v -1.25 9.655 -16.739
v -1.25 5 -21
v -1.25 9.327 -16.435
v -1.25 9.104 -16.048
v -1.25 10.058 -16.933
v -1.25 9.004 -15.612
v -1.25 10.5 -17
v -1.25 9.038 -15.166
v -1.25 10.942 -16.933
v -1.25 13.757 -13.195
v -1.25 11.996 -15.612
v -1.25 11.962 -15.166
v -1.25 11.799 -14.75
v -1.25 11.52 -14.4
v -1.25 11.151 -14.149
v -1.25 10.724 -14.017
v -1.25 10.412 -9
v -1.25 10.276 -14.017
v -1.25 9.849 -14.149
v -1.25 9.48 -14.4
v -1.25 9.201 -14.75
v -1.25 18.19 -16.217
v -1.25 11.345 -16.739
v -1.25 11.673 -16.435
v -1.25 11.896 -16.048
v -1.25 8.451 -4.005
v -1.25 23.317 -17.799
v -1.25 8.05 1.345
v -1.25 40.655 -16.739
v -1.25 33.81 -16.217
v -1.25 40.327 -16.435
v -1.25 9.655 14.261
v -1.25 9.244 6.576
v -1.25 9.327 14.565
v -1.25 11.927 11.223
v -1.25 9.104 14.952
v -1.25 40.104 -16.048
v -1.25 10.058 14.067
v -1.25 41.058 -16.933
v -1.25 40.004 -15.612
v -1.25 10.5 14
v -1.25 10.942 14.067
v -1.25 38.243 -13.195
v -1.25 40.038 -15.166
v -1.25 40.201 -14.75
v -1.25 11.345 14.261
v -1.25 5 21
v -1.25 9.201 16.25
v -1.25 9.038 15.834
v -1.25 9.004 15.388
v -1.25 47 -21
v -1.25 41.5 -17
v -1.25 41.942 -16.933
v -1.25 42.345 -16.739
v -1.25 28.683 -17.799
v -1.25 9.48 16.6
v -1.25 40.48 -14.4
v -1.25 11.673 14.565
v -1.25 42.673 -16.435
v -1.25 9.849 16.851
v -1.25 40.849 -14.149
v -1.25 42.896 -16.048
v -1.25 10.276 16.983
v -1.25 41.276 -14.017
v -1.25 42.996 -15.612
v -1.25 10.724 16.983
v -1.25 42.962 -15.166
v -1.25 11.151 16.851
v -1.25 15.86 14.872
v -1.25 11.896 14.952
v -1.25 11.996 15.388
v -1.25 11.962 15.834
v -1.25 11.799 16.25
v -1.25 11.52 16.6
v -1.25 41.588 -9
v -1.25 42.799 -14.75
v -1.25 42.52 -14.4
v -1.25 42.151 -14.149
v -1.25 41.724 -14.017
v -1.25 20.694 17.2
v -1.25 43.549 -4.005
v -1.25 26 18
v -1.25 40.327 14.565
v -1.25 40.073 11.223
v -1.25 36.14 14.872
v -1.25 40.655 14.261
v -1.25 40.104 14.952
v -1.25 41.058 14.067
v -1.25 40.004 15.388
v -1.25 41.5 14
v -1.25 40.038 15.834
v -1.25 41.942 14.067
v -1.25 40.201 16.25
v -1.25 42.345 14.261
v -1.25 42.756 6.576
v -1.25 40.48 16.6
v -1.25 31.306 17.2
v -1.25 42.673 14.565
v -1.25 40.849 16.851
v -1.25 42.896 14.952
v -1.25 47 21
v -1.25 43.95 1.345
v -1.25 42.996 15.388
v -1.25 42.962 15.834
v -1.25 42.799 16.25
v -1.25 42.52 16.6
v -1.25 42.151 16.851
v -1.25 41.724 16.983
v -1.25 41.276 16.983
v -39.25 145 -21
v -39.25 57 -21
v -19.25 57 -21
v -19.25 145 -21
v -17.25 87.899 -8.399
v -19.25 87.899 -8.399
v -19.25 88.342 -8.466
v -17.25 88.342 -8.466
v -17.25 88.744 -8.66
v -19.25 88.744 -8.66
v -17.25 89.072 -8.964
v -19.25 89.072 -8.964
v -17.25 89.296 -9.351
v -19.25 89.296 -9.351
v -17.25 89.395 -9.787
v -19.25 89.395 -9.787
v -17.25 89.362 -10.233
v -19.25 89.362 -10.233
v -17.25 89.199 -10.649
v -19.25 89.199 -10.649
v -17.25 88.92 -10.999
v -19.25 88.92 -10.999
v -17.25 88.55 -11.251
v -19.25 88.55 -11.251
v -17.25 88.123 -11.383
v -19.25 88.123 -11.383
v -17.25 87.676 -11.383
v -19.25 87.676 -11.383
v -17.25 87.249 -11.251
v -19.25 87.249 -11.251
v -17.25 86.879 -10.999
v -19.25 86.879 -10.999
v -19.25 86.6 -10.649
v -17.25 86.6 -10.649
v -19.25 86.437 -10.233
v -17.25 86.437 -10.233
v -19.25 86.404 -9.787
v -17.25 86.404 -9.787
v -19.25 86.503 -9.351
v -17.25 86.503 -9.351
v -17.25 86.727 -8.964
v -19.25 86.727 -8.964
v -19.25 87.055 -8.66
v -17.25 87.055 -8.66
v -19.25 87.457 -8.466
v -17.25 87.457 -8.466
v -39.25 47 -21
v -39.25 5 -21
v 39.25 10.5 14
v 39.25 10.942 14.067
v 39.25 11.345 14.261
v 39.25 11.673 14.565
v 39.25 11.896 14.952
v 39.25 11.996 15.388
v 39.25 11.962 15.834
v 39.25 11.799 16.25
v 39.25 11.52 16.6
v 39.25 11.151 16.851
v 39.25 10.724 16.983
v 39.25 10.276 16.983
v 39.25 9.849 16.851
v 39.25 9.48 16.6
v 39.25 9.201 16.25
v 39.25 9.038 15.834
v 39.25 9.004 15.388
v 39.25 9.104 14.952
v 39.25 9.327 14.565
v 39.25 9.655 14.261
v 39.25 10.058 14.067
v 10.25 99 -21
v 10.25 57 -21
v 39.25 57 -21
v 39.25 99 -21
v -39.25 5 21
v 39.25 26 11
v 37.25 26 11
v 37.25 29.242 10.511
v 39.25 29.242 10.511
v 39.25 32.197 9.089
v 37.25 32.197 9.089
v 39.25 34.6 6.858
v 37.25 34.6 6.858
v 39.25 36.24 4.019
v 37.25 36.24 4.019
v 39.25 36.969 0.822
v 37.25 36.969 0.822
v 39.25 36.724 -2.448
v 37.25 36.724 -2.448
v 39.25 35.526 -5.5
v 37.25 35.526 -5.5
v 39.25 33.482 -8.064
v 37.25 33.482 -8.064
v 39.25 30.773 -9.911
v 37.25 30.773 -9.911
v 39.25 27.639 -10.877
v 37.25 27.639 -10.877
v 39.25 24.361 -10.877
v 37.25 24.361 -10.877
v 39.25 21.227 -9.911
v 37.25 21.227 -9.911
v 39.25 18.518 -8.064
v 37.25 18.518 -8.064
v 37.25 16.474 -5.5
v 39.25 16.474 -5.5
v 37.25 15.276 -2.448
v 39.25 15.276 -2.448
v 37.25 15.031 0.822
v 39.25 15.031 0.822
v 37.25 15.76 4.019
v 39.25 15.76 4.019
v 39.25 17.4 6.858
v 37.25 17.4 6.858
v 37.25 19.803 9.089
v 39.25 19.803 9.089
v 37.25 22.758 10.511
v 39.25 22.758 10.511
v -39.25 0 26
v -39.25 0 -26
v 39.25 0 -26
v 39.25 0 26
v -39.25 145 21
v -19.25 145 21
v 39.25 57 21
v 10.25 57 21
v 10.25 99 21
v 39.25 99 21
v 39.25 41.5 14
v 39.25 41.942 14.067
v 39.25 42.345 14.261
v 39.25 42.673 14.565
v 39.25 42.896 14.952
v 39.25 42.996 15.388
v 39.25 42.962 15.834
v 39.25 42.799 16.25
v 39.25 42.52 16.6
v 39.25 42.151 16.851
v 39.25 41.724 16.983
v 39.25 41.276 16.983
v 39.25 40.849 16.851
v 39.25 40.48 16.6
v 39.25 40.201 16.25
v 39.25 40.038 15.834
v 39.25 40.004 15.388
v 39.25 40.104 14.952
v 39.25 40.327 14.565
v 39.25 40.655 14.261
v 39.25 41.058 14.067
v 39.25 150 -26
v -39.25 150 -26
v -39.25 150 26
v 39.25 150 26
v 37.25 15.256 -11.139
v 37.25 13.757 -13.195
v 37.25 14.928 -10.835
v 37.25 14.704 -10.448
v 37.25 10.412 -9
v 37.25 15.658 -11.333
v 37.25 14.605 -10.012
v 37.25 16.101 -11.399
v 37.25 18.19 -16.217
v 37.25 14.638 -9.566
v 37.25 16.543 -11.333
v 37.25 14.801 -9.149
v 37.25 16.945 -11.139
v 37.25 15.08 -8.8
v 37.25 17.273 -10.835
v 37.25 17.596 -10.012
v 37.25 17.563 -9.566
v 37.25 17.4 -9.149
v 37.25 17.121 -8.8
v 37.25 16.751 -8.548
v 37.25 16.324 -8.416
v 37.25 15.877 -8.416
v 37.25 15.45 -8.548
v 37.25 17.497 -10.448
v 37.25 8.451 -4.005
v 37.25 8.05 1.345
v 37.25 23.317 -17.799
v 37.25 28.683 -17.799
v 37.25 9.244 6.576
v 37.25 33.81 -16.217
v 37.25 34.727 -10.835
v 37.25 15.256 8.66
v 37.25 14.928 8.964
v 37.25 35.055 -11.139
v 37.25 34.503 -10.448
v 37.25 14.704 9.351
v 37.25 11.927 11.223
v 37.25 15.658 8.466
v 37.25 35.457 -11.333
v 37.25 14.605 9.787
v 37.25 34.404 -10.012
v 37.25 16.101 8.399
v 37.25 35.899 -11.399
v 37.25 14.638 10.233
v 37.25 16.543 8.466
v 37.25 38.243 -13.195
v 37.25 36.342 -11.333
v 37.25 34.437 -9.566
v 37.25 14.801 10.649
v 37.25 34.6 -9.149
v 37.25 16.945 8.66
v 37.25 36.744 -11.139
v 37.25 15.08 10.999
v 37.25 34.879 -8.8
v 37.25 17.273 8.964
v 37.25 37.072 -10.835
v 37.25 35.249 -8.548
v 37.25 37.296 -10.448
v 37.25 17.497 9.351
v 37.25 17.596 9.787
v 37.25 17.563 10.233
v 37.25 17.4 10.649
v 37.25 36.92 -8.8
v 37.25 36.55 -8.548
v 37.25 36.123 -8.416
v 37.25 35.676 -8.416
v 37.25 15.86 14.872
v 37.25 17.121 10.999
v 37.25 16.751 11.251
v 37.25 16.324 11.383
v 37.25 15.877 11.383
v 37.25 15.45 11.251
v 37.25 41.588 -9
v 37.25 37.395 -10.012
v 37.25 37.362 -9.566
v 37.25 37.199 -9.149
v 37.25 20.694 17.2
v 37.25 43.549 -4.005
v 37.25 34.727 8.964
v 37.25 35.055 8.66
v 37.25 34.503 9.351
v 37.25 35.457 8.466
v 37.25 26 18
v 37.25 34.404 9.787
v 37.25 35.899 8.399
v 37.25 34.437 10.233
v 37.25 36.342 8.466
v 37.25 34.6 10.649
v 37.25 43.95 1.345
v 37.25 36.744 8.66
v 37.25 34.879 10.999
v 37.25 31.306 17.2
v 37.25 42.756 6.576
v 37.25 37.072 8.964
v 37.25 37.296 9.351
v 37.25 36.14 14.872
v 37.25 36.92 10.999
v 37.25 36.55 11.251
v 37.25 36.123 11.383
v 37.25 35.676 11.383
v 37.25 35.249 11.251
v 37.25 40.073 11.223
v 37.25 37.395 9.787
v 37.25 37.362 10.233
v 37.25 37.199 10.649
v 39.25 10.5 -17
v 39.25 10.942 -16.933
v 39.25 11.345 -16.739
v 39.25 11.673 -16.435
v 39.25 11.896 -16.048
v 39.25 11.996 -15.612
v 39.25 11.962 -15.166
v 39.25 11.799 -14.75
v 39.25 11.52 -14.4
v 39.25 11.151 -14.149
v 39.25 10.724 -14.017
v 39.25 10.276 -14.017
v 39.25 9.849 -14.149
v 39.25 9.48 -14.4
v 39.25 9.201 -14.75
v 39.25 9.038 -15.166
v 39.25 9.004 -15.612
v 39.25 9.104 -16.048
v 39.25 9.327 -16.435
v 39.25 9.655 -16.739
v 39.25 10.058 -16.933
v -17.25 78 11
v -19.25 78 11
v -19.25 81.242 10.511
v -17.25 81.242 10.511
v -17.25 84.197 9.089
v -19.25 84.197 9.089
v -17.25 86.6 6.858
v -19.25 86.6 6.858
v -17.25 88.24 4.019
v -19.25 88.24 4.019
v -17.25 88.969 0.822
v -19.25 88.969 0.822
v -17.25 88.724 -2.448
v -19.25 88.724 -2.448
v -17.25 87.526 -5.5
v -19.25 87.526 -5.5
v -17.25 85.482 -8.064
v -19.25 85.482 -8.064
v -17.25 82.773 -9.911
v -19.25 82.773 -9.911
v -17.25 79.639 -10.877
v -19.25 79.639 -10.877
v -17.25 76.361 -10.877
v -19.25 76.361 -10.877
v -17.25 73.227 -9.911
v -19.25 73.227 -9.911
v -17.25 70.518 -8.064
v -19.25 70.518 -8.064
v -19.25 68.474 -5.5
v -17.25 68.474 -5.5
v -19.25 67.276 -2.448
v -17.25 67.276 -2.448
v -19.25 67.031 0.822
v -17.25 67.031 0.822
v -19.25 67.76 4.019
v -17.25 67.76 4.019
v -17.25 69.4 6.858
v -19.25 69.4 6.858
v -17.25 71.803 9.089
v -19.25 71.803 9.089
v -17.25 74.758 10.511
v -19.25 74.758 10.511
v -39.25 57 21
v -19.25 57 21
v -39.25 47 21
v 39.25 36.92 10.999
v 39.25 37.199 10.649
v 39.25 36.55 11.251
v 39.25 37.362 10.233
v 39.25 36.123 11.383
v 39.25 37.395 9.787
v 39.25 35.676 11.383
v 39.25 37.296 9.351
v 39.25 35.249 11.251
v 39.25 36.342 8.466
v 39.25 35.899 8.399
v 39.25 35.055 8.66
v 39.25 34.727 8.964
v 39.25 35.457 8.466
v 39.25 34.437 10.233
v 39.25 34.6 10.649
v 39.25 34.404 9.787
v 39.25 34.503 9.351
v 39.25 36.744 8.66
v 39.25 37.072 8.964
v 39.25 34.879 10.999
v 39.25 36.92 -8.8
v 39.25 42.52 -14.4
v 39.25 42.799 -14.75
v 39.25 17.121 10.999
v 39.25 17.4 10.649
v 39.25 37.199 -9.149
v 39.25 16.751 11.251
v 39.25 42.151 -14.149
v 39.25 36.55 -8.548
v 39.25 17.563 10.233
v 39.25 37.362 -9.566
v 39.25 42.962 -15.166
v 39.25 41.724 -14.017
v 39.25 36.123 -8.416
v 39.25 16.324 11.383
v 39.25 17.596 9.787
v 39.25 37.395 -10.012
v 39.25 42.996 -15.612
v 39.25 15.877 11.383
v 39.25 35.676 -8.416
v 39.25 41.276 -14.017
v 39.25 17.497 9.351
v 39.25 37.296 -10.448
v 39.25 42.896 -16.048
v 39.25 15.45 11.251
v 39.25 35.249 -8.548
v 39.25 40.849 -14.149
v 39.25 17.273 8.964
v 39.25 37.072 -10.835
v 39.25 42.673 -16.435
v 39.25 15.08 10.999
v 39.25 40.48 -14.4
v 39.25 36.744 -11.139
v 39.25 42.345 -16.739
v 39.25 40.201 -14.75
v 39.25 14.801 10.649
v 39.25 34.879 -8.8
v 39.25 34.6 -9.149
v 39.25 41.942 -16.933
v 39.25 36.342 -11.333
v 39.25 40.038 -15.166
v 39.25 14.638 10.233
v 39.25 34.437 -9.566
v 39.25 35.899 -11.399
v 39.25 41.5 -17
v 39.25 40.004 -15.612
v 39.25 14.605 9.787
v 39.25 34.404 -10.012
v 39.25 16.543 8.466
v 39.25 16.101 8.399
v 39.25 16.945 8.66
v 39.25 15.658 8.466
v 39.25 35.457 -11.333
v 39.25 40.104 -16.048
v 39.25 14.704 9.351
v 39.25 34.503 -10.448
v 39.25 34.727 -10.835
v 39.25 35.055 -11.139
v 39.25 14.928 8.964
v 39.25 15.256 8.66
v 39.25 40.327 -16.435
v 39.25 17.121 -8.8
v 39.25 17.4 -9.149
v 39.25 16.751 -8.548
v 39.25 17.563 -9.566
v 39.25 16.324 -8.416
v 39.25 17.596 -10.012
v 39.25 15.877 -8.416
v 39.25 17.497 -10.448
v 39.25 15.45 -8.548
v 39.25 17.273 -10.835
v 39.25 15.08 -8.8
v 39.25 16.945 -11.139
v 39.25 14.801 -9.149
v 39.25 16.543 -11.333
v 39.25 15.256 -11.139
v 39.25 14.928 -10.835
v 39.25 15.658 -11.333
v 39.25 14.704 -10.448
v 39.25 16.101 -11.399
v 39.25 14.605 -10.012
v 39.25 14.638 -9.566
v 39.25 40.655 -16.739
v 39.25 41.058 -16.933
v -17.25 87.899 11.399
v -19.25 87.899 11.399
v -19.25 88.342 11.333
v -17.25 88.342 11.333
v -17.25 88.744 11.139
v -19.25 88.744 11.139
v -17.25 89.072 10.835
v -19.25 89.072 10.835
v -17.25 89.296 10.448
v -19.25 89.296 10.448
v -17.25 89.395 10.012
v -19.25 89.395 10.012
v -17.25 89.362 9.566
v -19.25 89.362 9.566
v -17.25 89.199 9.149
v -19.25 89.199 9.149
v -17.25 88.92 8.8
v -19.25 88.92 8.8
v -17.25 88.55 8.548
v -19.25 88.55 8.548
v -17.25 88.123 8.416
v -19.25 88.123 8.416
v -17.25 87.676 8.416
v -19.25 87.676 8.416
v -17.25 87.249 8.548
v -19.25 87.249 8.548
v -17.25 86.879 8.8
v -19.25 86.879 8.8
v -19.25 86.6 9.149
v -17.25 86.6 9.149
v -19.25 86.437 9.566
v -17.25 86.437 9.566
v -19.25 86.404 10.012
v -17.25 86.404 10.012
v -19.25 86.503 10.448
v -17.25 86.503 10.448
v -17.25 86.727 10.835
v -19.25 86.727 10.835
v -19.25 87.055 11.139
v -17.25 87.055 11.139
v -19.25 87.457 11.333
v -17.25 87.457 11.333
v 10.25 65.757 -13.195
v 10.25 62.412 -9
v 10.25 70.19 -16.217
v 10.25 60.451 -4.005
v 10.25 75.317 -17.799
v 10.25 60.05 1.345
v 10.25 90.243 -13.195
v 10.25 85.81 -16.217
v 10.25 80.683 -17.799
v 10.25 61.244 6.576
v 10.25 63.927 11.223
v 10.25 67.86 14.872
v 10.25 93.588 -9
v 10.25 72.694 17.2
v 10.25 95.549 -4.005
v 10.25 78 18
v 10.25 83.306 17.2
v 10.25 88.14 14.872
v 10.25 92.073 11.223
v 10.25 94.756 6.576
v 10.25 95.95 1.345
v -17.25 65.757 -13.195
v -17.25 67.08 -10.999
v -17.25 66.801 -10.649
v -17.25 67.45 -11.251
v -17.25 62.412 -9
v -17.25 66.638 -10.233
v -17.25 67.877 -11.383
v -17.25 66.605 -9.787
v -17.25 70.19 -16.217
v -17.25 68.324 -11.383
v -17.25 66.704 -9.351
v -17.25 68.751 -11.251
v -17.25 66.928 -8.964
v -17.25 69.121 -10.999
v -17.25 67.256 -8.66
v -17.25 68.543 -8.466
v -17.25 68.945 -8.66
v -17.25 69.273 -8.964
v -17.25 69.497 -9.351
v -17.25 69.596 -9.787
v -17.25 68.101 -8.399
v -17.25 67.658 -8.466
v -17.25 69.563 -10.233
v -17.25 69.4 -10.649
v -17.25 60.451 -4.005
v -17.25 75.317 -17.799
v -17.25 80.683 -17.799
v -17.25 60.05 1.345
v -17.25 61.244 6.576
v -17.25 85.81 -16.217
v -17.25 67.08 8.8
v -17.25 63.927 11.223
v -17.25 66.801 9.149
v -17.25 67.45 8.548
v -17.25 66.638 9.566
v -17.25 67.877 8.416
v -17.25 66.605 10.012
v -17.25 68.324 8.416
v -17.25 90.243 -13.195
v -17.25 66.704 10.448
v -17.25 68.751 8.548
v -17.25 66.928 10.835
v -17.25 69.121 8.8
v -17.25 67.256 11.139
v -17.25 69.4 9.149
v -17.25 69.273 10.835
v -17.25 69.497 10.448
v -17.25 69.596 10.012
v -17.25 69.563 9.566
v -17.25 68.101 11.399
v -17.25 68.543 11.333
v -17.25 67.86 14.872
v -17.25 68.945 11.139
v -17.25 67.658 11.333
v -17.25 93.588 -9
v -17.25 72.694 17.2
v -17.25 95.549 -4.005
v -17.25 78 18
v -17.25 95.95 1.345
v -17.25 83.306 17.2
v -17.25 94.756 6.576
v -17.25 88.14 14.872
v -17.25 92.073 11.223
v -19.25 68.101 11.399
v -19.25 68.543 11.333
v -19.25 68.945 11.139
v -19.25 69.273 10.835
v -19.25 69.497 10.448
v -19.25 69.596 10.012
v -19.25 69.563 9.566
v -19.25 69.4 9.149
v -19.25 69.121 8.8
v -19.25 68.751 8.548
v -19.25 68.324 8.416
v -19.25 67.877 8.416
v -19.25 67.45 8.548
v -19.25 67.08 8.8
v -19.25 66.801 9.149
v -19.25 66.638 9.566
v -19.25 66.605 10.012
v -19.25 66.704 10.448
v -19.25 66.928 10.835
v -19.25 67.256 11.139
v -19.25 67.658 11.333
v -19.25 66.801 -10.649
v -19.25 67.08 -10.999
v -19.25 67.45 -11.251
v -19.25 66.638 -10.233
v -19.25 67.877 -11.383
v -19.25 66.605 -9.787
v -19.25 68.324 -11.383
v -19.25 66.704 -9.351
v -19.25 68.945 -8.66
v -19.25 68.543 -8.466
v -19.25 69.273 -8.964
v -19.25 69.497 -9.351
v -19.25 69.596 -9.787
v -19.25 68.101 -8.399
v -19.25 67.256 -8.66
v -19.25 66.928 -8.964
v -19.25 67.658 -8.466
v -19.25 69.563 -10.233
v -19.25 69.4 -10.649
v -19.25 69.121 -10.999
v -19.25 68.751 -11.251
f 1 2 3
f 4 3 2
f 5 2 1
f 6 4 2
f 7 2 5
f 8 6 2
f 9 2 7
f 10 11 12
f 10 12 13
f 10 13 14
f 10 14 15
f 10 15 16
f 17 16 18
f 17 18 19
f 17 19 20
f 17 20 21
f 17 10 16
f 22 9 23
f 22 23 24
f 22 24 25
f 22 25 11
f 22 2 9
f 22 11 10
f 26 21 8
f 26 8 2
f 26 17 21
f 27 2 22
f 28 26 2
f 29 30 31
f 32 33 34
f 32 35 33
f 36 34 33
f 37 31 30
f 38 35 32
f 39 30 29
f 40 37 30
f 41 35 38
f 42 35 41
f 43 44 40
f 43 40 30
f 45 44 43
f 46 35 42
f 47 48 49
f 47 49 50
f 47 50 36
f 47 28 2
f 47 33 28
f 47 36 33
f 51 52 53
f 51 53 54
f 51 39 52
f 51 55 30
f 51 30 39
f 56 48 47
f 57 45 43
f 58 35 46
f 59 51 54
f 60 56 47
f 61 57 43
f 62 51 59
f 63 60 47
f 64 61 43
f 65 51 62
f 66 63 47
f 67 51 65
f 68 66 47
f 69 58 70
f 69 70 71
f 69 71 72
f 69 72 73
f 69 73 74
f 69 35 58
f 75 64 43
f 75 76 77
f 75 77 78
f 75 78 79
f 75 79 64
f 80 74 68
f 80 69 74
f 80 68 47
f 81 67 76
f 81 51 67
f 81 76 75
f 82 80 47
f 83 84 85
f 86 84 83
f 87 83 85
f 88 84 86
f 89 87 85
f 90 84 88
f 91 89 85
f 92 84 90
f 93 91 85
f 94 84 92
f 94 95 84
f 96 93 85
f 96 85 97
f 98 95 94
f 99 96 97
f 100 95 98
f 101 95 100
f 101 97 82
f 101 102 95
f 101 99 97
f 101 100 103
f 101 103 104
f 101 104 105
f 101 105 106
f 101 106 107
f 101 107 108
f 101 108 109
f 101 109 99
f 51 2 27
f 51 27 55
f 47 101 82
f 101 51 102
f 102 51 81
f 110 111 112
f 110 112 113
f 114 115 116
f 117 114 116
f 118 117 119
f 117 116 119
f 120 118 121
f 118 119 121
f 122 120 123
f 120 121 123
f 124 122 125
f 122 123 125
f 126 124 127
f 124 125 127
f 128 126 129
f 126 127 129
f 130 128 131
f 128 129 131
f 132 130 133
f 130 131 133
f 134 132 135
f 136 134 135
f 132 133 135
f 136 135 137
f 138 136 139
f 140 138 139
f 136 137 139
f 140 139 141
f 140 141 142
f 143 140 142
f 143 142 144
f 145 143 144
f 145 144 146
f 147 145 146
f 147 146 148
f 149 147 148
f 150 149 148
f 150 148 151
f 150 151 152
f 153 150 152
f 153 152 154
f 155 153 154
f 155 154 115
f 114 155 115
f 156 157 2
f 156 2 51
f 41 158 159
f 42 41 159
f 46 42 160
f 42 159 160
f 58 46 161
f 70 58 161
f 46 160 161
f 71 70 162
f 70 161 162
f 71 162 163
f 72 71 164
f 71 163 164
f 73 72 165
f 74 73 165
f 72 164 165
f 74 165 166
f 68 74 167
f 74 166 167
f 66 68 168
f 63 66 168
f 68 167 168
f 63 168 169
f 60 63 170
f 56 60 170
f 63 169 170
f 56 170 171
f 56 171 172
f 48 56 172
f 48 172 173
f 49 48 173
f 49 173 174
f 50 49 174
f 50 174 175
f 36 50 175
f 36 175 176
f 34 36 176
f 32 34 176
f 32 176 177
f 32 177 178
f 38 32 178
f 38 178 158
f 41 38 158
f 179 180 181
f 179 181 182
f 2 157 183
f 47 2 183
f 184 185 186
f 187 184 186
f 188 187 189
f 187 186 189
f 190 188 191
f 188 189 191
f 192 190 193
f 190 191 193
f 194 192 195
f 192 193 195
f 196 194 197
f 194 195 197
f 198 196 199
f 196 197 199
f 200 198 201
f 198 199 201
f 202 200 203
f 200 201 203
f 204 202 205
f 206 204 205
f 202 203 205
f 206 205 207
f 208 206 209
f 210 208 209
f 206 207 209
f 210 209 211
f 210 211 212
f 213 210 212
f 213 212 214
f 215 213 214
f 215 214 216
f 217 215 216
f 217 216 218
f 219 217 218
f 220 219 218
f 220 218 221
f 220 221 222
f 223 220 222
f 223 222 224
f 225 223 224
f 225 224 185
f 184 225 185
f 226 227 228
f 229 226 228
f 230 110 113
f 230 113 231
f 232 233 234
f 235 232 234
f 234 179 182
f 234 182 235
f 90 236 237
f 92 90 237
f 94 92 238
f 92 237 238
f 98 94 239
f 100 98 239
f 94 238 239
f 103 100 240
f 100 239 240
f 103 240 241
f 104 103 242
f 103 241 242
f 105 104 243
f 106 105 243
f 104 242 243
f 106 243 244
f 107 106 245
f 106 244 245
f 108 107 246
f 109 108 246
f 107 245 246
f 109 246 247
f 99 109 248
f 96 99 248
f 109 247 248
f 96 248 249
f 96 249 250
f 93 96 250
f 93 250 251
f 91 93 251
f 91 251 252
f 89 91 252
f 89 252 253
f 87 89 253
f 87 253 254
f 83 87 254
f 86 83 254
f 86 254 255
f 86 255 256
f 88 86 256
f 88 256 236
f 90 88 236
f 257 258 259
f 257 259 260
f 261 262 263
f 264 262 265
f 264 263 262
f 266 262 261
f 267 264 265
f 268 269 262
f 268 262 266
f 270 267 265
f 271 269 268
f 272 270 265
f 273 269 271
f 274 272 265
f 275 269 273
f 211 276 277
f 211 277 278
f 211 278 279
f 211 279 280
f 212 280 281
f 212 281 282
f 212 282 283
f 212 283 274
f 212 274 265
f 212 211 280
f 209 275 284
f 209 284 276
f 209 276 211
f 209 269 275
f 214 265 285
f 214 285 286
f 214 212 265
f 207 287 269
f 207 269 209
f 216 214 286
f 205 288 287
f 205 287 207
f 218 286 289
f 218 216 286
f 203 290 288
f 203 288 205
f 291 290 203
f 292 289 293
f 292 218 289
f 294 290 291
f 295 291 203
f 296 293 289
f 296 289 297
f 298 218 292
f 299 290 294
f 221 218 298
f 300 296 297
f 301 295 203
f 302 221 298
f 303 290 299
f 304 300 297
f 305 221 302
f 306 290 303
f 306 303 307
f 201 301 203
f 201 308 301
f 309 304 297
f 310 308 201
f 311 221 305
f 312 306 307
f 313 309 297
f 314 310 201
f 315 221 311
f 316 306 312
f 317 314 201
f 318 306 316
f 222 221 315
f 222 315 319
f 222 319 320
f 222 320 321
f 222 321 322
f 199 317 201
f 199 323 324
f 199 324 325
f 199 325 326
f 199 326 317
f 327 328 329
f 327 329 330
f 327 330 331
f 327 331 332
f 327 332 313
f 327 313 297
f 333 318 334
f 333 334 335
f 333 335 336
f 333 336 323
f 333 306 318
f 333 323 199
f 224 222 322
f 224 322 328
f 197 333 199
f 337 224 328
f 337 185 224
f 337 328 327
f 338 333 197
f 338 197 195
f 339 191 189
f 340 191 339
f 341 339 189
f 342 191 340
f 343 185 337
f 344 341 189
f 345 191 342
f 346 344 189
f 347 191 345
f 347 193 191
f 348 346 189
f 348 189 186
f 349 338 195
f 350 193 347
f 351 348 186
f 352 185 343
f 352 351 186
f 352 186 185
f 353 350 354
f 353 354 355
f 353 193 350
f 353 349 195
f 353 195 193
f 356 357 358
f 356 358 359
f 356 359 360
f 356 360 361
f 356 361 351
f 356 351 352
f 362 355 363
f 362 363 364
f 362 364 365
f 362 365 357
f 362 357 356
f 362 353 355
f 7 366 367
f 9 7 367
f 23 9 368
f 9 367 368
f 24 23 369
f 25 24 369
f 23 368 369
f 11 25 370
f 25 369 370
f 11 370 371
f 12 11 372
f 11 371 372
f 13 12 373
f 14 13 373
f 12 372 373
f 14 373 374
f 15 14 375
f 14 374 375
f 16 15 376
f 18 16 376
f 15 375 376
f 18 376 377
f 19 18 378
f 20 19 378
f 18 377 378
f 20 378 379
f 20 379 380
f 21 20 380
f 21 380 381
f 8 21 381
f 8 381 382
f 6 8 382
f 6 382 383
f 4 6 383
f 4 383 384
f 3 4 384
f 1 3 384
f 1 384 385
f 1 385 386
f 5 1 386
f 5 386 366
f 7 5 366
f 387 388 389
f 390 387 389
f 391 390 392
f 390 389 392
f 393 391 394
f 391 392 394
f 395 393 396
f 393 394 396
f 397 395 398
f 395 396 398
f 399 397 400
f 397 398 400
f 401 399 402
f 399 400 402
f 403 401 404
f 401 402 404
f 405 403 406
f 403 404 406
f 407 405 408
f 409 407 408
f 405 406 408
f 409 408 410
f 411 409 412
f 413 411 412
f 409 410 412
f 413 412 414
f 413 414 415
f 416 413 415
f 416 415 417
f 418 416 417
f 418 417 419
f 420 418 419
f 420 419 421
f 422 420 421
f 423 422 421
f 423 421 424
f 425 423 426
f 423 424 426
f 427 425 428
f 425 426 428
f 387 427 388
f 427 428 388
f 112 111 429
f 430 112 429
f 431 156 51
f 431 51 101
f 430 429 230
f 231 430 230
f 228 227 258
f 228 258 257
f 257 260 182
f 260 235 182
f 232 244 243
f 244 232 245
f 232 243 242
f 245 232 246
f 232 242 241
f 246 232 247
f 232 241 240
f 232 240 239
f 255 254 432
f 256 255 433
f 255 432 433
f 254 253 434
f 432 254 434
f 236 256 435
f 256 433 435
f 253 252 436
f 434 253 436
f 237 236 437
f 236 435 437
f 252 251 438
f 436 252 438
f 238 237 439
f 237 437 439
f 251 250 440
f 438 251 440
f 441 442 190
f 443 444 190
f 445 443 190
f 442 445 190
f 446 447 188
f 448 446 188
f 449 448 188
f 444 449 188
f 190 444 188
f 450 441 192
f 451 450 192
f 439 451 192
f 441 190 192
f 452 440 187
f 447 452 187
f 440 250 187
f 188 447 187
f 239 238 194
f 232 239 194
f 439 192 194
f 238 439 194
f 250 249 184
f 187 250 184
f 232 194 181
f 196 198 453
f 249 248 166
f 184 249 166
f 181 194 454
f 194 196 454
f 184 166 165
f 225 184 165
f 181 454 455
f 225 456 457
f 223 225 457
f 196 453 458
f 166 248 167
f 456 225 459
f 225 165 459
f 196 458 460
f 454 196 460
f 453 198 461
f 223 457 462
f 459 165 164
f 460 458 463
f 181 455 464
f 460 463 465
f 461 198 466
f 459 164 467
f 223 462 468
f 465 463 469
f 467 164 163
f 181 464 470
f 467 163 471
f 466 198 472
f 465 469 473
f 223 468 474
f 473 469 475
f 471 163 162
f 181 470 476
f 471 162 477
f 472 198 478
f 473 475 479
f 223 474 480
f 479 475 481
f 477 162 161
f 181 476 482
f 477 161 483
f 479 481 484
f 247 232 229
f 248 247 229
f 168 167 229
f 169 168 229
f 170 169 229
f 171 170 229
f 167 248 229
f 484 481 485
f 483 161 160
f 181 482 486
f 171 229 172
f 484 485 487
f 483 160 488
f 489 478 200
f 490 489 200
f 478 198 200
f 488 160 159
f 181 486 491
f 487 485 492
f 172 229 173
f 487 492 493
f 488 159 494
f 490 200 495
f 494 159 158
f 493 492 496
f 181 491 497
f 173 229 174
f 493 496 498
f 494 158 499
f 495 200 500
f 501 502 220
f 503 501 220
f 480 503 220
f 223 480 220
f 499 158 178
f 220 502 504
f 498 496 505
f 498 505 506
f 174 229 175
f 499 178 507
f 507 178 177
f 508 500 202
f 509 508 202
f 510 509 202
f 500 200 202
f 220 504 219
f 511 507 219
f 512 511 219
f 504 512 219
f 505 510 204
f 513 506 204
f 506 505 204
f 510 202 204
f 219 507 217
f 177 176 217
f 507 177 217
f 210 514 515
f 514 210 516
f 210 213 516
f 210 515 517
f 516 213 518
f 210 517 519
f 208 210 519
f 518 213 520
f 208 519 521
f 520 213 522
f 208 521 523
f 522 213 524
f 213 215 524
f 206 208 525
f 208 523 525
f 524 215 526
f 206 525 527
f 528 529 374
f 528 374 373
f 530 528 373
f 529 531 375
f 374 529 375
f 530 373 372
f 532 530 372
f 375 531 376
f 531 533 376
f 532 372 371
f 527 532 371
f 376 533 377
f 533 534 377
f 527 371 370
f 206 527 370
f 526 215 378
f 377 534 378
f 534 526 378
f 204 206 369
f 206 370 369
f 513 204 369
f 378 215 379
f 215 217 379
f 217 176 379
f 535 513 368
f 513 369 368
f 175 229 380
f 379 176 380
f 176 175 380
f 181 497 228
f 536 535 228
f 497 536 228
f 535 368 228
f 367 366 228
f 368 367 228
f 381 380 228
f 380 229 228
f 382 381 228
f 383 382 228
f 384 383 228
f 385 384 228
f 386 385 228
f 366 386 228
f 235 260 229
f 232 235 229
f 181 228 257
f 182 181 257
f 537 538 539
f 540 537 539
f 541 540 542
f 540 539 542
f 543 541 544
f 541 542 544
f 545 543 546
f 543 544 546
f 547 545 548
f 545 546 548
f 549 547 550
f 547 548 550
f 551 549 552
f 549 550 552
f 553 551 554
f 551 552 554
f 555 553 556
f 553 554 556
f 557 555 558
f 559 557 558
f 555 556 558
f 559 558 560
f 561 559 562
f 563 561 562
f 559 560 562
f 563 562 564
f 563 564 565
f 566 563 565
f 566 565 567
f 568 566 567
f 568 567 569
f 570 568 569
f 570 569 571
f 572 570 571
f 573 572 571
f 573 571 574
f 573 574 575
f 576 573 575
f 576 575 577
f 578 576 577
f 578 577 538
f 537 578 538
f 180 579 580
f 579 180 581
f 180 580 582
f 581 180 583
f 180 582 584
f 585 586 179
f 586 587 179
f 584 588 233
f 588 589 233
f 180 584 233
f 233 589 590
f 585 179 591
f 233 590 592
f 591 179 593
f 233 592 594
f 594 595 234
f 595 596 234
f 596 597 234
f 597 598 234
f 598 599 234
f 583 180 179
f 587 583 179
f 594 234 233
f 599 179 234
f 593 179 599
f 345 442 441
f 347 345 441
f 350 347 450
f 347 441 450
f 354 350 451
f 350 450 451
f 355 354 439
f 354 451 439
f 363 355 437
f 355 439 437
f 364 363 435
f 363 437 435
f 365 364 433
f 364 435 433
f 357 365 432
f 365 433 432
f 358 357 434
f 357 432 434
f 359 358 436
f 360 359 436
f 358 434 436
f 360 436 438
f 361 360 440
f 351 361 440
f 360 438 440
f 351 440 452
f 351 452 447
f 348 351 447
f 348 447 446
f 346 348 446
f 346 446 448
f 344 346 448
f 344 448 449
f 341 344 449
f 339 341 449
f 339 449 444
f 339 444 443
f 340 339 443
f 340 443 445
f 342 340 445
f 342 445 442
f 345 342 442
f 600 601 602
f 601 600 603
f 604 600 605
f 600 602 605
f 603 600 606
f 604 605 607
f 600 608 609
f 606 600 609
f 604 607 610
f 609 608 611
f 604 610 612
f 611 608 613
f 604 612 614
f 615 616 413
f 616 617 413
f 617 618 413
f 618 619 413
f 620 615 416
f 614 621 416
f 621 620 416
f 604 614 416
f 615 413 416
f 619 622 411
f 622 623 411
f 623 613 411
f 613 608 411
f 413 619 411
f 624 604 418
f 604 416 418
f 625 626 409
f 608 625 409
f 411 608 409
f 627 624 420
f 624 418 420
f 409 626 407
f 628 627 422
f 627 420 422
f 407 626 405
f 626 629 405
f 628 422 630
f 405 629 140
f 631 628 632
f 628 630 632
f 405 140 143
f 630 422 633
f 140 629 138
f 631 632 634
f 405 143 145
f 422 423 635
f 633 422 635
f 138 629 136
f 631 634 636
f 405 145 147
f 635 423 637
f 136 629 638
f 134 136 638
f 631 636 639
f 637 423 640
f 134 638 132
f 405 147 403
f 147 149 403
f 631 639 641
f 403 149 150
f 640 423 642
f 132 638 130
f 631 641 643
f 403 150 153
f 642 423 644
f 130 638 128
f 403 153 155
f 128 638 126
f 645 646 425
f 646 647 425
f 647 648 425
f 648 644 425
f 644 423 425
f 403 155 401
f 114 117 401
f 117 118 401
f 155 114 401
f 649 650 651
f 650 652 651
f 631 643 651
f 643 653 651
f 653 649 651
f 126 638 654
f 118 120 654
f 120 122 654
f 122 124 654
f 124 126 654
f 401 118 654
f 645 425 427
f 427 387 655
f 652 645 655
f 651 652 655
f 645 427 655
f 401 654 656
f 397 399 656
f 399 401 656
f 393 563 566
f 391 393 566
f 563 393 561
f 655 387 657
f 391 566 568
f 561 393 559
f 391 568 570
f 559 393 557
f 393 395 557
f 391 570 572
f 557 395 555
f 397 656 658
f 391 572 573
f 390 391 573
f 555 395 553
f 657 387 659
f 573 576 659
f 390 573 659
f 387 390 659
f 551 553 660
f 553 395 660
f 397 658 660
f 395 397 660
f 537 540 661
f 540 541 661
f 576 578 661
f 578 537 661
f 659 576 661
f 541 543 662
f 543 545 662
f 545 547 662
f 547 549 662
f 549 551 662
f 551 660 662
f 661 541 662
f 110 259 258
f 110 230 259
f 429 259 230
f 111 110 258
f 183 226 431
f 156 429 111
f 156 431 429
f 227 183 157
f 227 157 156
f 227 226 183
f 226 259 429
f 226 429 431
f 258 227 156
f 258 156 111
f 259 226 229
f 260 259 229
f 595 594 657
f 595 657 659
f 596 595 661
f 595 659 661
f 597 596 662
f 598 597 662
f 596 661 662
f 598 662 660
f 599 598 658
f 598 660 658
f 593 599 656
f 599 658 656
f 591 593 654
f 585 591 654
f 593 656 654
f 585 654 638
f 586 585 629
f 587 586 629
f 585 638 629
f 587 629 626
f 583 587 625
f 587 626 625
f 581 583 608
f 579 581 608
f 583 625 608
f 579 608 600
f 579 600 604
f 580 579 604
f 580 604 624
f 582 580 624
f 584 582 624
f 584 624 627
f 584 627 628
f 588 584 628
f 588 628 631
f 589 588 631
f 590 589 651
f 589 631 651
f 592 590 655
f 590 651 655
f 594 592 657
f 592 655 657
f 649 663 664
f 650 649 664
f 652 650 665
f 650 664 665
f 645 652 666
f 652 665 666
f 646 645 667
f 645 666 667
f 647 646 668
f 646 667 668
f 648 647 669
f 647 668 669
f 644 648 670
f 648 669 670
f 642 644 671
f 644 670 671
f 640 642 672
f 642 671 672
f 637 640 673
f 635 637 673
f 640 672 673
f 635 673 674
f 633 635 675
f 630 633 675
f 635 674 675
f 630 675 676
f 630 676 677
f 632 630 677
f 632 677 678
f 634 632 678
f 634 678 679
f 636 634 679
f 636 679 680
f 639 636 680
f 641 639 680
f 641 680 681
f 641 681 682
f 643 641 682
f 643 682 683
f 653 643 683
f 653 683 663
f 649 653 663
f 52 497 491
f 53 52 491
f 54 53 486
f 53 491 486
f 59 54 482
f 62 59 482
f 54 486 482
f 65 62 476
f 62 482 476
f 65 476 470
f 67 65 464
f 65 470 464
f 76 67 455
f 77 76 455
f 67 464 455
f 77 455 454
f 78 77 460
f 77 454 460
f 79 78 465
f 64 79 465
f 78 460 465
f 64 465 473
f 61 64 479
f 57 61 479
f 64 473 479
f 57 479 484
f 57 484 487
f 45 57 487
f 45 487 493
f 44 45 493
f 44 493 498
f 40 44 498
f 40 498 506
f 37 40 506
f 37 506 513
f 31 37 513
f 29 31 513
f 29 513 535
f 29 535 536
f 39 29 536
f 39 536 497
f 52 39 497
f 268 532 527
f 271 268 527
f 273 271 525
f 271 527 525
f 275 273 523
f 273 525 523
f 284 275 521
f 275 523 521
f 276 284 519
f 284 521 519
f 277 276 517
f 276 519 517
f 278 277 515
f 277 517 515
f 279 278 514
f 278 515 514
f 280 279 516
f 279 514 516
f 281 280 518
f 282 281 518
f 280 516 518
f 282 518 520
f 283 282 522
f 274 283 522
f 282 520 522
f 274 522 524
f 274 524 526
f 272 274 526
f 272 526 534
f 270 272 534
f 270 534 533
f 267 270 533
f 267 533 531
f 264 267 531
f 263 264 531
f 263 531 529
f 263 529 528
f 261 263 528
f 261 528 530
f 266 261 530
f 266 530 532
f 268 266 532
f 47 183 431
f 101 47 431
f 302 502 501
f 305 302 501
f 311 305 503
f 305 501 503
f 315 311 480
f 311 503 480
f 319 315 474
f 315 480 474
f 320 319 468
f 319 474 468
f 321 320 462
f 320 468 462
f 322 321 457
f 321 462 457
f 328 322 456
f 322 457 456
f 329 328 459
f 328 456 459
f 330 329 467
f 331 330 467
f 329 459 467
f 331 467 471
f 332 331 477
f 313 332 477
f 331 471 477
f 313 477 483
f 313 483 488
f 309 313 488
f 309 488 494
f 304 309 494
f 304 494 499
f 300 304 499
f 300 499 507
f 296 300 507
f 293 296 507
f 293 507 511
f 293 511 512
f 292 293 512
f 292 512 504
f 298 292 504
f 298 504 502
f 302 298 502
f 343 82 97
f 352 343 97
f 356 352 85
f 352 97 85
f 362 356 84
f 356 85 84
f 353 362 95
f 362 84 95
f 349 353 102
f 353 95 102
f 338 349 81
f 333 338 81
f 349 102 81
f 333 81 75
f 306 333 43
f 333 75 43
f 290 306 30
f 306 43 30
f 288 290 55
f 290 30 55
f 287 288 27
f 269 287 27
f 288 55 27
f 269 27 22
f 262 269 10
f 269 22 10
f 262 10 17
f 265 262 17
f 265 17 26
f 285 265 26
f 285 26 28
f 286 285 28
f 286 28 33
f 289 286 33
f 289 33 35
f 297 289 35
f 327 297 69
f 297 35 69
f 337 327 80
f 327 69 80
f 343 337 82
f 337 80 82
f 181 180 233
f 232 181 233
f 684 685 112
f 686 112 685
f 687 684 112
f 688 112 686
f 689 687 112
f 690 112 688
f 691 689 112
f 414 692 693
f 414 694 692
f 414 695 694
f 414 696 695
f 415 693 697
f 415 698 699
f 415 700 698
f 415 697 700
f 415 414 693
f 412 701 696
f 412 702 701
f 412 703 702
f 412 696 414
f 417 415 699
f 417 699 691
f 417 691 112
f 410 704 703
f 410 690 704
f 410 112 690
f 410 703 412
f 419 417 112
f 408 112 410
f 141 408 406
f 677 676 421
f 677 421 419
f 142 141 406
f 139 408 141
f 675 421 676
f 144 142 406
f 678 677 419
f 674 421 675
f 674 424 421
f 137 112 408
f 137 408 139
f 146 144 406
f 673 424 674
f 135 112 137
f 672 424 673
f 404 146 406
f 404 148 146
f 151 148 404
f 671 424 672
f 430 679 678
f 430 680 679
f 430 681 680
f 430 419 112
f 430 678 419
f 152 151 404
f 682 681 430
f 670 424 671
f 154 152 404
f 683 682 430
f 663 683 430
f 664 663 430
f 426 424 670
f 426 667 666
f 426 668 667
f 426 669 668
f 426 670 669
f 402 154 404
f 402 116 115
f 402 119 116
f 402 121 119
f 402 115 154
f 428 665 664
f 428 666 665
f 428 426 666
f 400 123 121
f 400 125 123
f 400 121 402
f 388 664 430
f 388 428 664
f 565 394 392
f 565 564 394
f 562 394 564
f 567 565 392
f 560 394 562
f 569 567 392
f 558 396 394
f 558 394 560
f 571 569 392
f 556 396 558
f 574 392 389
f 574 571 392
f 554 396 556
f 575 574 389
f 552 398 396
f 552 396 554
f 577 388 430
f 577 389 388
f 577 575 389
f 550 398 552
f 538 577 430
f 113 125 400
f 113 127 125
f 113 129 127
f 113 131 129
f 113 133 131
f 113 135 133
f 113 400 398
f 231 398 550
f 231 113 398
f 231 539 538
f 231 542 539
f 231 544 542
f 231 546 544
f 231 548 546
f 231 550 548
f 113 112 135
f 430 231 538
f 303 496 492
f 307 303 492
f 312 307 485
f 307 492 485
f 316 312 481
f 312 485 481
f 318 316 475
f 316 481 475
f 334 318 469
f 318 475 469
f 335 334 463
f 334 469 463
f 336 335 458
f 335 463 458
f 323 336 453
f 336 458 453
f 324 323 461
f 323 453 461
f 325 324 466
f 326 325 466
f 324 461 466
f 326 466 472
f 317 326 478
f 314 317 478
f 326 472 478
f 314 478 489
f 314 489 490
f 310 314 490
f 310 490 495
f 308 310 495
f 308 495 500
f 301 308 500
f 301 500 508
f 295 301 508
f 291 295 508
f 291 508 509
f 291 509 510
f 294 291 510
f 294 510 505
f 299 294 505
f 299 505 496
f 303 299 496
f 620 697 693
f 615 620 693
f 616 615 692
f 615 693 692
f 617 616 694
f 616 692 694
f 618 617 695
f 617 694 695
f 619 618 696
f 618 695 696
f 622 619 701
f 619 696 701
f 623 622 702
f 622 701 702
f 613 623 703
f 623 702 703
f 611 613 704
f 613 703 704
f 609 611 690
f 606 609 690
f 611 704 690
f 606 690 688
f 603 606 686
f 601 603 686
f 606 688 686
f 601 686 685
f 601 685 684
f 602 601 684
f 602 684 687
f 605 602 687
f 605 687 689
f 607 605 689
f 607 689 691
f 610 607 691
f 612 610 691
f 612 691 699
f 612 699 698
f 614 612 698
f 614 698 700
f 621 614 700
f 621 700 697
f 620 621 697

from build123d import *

# Parameters (mm, degrees)
SKETCH_1_W           = 78.5
SKETCH_1_H           = 52
EXTRUDE_1_DEPTH      = 150
SKETCH_2_W           = 42
SKETCH_2_H           = 42
CUT_EXTRUDE_1_DEPTH  = 38
SKETCH_3_R           = 18
CUT_EXTRUDE_2_DEPTH  = 38.5
CUT_EXTRUDE_3_REACH  = 172.377
SKETCH_4_R           = 11
CUT_EXTRUDE_4_REACH  = 173.284
SKETCH_5_R           = 1.5
CUT_EXTRUDE_5_REACH  = 173.284
SKETCH_8_R           = 1.5
SKETCH_15_W          = 42
SKETCH_15_H          = 88
CUT_EXTRUDE_13_DEPTH = 20
SKETCH_16_R          = 11
CUT_EXTRUDE_14_DEPTH = 2
SKETCH_17_R          = 18
CUT_EXTRUDE_15_DEPTH = 27.5
SKETCH_18_W          = 42
SKETCH_18_H          = 42
SKETCH_18_R          = 18
SKETCH_18_R_2        = 11
CUT_EXTRUDE_16_DEPTH = 29
CUT_EXTRUDE_17_REACH = 165.09
SKETCH_19_R          = 1.5


with BuildPart() as part:
    # 草图1 → 凸台-拉伸1 (new body)
    with BuildSketch(Plane(origin=(0, 0, 0), x_dir=(1, 0, 0), z_dir=(0, 1, 0))):
        Rectangle(SKETCH_1_W, SKETCH_1_H)
    extrude(amount=EXTRUDE_1_DEPTH)

    # 草图2 → 切除-拉伸1 (cut)
    with BuildSketch(Plane.ZY.offset(39.25)):
        with Locations((0, 26)):
            Rectangle(SKETCH_2_W, SKETCH_2_H)
    extrude(amount=-CUT_EXTRUDE_1_DEPTH, mode=Mode.SUBTRACT)

    # 草图3 → 切除-拉伸2 (cut)
    with BuildSketch(Plane.ZY.offset(1.25)):
        with Locations((0, 26)):
            Circle(SKETCH_3_R)
    extrude(amount=-CUT_EXTRUDE_2_DEPTH, mode=Mode.SUBTRACT)

    # 草图4 → 切除-拉伸3 (cut, up to next)
    with BuildSketch(Plane.ZY.offset(-37.25), mode=Mode.PRIVATE) as cut_extrude_3_sk1:
        with Locations((0, 26)):
            Circle(SKETCH_4_R)
    cut_extrude_3_tool1 = extrude(cut_extrude_3_sk1.sketch, amount=-CUT_EXTRUDE_3_REACH, mode=Mode.PRIVATE) & part.part
    add(cut_extrude_3_tool1.solids().sort_by_distance((37.25, 26, 0))[0], mode=Mode.SUBTRACT)

    # 草图5 → 切除-拉伸4 (cut, up to next)
    with BuildSketch(Plane(origin=(39.25, 0, 0), x_dir=(0, 0, -1), z_dir=(1, 0, 0)), mode=Mode.PRIVATE) as cut_extrude_4_sk1:
        with Locations((-9.899494937, 35.899494937)):
            Circle(SKETCH_5_R)
    cut_extrude_4_tool1 = extrude(cut_extrude_4_sk1.sketch, amount=-CUT_EXTRUDE_4_REACH, mode=Mode.PRIVATE) & part.part
    # 草图5 → 切除-拉伸4 (cut, up to next)
    with BuildSketch(Plane(origin=(39.25, 0, 0), x_dir=(0, 0, -1), z_dir=(1, 0, 0)), mode=Mode.PRIVATE) as cut_extrude_4_sk2:
        with Locations((9.899494937, 35.899494937)):
            Circle(SKETCH_5_R)
    cut_extrude_4_tool2 = extrude(cut_extrude_4_sk2.sketch, amount=-CUT_EXTRUDE_4_REACH, mode=Mode.PRIVATE) & part.part
    # 草图5 → 切除-拉伸4 (cut, up to next)
    with BuildSketch(Plane(origin=(39.25, 0, 0), x_dir=(0, 0, -1), z_dir=(1, 0, 0)), mode=Mode.PRIVATE) as cut_extrude_4_sk3:
        with Locations((9.899494937, 16.100505063)):
            Circle(SKETCH_5_R)
    cut_extrude_4_tool3 = extrude(cut_extrude_4_sk3.sketch, amount=-CUT_EXTRUDE_4_REACH, mode=Mode.PRIVATE) & part.part
    # 草图5 → 切除-拉伸4 (cut, up to next)
    with BuildSketch(Plane(origin=(39.25, 0, 0), x_dir=(0, 0, -1), z_dir=(1, 0, 0)), mode=Mode.PRIVATE) as cut_extrude_4_sk4:
        with Locations((-9.899494937, 16.100505063)):
            Circle(SKETCH_5_R)
    cut_extrude_4_tool4 = extrude(cut_extrude_4_sk4.sketch, amount=-CUT_EXTRUDE_4_REACH, mode=Mode.PRIVATE) & part.part
    add(cut_extrude_4_tool1.solids().sort_by_distance((39.25, 35.899495, 9.899495))[0], mode=Mode.SUBTRACT)
    add(cut_extrude_4_tool2.solids().sort_by_distance((39.25, 35.899495, -9.899495))[0], mode=Mode.SUBTRACT)
    add(cut_extrude_4_tool3.solids().sort_by_distance((39.25, 16.100505, -9.899495))[0], mode=Mode.SUBTRACT)
    add(cut_extrude_4_tool4.solids().sort_by_distance((39.25, 16.100505, 9.899495))[0], mode=Mode.SUBTRACT)

    # 草图8 → 切除-拉伸5 (cut, up to next)
    with BuildSketch(Plane(origin=(39.25, 0, 0), x_dir=(0, 0, -1), z_dir=(1, 0, 0)), mode=Mode.PRIVATE) as cut_extrude_5_sk1:
        with Locations((-15.5, 41.5)):
            Circle(SKETCH_8_R)
    cut_extrude_5_tool1 = extrude(cut_extrude_5_sk1.sketch, amount=-CUT_EXTRUDE_5_REACH, mode=Mode.PRIVATE) & part.part
    # 草图8 → 切除-拉伸5 (cut, up to next)
    with BuildSketch(Plane(origin=(39.25, 0, 0), x_dir=(0, 0, -1), z_dir=(1, 0, 0)), mode=Mode.PRIVATE) as cut_extrude_5_sk2:
        with Locations((15.5, 41.5)):
            Circle(SKETCH_8_R)
    cut_extrude_5_tool2 = extrude(cut_extrude_5_sk2.sketch, amount=-CUT_EXTRUDE_5_REACH, mode=Mode.PRIVATE) & part.part
    # 草图8 → 切除-拉伸5 (cut, up to next)
    with BuildSketch(Plane(origin=(39.25, 0, 0), x_dir=(0, 0, -1), z_dir=(1, 0, 0)), mode=Mode.PRIVATE) as cut_extrude_5_sk3:
        with Locations((-15.5, 10.5)):
            Circle(SKETCH_8_R)
    cut_extrude_5_tool3 = extrude(cut_extrude_5_sk3.sketch, amount=-CUT_EXTRUDE_5_REACH, mode=Mode.PRIVATE) & part.part
    # 草图8 → 切除-拉伸5 (cut, up to next)
    with BuildSketch(Plane(origin=(39.25, 0, 0), x_dir=(0, 0, -1), z_dir=(1, 0, 0)), mode=Mode.PRIVATE) as cut_extrude_5_sk4:
        with Locations((15.5, 10.5)):
            Circle(SKETCH_8_R)
    cut_extrude_5_tool4 = extrude(cut_extrude_5_sk4.sketch, amount=-CUT_EXTRUDE_5_REACH, mode=Mode.PRIVATE) & part.part
    add(cut_extrude_5_tool1.solids().sort_by_distance((39.25, 41.5, 15.5))[0], mode=Mode.SUBTRACT)
    add(cut_extrude_5_tool2.solids().sort_by_distance((39.25, 41.5, -15.5))[0], mode=Mode.SUBTRACT)
    add(cut_extrude_5_tool3.solids().sort_by_distance((39.25, 10.5, 15.5))[0], mode=Mode.SUBTRACT)
    add(cut_extrude_5_tool4.solids().sort_by_distance((39.25, 10.5, -15.5))[0], mode=Mode.SUBTRACT)

    # 草图15 → 切除-拉伸13 (cut)
    with BuildSketch(Plane.ZY.offset(39.25)):
        with Locations((0, 101)):
            Rectangle(SKETCH_15_W, SKETCH_15_H)
    extrude(amount=-CUT_EXTRUDE_13_DEPTH, mode=Mode.SUBTRACT)

    # 草图16 → 切除-拉伸14 (cut)
    with BuildSketch(Plane.ZY.offset(19.25)):
        with Locations((0, 78)):
            Circle(SKETCH_16_R)
    extrude(amount=-CUT_EXTRUDE_14_DEPTH, mode=Mode.SUBTRACT)

    # 草图17 → 切除-拉伸15 (cut)
    with BuildSketch(Plane.ZY.offset(17.25)):
        with Locations((0, 78)):
            Circle(SKETCH_17_R)
    extrude(amount=-CUT_EXTRUDE_15_DEPTH, mode=Mode.SUBTRACT)

    # 草图18 → 切除-拉伸16 (cut)
    # profile 1 of 3: a face of its own
    with BuildSketch(Plane.ZY.offset(-10.25)):
        with Locations((0, 78)):
            Rectangle(SKETCH_18_W, SKETCH_18_H)
        with Locations((0, 78)):
            Circle(SKETCH_18_R, mode=Mode.SUBTRACT)
    # profile 2 of 3: a face of its own
    with BuildSketch(Plane.ZY.offset(-10.25)):
        with Locations((0, 78)):
            Circle(SKETCH_18_R)
        with Locations((0, 78)):
            Circle(SKETCH_18_R_2, mode=Mode.SUBTRACT)
    # profile 3 of 3: a face of its own
    with BuildSketch(Plane.ZY.offset(-10.25)):
        with Locations((0, 78)):
            Circle(SKETCH_18_R_2)
    extrude(amount=-CUT_EXTRUDE_16_DEPTH, mode=Mode.SUBTRACT)

    # 草图19 → 切除-拉伸17 (cut, up to next)
    with BuildSketch(Plane.ZY.offset(19.25), mode=Mode.PRIVATE) as cut_extrude_17_sk1:
        with Locations((-9.899494937, 87.899494937)):
            Circle(SKETCH_19_R)
    cut_extrude_17_tool1 = extrude(cut_extrude_17_sk1.sketch, amount=-CUT_EXTRUDE_17_REACH, mode=Mode.PRIVATE) & part.part
    # 草图19 → 切除-拉伸17 (cut, up to next)
    with BuildSketch(Plane.ZY.offset(19.25), mode=Mode.PRIVATE) as cut_extrude_17_sk2:
        with Locations((9.899494937, 87.899494937)):
            Circle(SKETCH_19_R)
    cut_extrude_17_tool2 = extrude(cut_extrude_17_sk2.sketch, amount=-CUT_EXTRUDE_17_REACH, mode=Mode.PRIVATE) & part.part
    # 草图19 → 切除-拉伸17 (cut, up to next)
    with BuildSketch(Plane.ZY.offset(19.25), mode=Mode.PRIVATE) as cut_extrude_17_sk3:
        with Locations((9.899494937, 68.100505063)):
            Circle(SKETCH_19_R)
    cut_extrude_17_tool3 = extrude(cut_extrude_17_sk3.sketch, amount=-CUT_EXTRUDE_17_REACH, mode=Mode.PRIVATE) & part.part
    # 草图19 → 切除-拉伸17 (cut, up to next)
    with BuildSketch(Plane.ZY.offset(19.25), mode=Mode.PRIVATE) as cut_extrude_17_sk4:
        with Locations((-9.899494937, 68.100505063)):
            Circle(SKETCH_19_R)
    cut_extrude_17_tool4 = extrude(cut_extrude_17_sk4.sketch, amount=-CUT_EXTRUDE_17_REACH, mode=Mode.PRIVATE) & part.part
    add(cut_extrude_17_tool1.solids().sort_by_distance((-19.25, 87.899495, -9.899495))[0], mode=Mode.SUBTRACT)
    add(cut_extrude_17_tool2.solids().sort_by_distance((-19.25, 87.899495, 9.899495))[0], mode=Mode.SUBTRACT)
    add(cut_extrude_17_tool3.solids().sort_by_distance((-19.25, 68.100505, 9.899495))[0], mode=Mode.SUBTRACT)
    add(cut_extrude_17_tool4.solids().sort_by_distance((-19.25, 68.100505, -9.899495))[0], mode=Mode.SUBTRACT)


solid = part.part
